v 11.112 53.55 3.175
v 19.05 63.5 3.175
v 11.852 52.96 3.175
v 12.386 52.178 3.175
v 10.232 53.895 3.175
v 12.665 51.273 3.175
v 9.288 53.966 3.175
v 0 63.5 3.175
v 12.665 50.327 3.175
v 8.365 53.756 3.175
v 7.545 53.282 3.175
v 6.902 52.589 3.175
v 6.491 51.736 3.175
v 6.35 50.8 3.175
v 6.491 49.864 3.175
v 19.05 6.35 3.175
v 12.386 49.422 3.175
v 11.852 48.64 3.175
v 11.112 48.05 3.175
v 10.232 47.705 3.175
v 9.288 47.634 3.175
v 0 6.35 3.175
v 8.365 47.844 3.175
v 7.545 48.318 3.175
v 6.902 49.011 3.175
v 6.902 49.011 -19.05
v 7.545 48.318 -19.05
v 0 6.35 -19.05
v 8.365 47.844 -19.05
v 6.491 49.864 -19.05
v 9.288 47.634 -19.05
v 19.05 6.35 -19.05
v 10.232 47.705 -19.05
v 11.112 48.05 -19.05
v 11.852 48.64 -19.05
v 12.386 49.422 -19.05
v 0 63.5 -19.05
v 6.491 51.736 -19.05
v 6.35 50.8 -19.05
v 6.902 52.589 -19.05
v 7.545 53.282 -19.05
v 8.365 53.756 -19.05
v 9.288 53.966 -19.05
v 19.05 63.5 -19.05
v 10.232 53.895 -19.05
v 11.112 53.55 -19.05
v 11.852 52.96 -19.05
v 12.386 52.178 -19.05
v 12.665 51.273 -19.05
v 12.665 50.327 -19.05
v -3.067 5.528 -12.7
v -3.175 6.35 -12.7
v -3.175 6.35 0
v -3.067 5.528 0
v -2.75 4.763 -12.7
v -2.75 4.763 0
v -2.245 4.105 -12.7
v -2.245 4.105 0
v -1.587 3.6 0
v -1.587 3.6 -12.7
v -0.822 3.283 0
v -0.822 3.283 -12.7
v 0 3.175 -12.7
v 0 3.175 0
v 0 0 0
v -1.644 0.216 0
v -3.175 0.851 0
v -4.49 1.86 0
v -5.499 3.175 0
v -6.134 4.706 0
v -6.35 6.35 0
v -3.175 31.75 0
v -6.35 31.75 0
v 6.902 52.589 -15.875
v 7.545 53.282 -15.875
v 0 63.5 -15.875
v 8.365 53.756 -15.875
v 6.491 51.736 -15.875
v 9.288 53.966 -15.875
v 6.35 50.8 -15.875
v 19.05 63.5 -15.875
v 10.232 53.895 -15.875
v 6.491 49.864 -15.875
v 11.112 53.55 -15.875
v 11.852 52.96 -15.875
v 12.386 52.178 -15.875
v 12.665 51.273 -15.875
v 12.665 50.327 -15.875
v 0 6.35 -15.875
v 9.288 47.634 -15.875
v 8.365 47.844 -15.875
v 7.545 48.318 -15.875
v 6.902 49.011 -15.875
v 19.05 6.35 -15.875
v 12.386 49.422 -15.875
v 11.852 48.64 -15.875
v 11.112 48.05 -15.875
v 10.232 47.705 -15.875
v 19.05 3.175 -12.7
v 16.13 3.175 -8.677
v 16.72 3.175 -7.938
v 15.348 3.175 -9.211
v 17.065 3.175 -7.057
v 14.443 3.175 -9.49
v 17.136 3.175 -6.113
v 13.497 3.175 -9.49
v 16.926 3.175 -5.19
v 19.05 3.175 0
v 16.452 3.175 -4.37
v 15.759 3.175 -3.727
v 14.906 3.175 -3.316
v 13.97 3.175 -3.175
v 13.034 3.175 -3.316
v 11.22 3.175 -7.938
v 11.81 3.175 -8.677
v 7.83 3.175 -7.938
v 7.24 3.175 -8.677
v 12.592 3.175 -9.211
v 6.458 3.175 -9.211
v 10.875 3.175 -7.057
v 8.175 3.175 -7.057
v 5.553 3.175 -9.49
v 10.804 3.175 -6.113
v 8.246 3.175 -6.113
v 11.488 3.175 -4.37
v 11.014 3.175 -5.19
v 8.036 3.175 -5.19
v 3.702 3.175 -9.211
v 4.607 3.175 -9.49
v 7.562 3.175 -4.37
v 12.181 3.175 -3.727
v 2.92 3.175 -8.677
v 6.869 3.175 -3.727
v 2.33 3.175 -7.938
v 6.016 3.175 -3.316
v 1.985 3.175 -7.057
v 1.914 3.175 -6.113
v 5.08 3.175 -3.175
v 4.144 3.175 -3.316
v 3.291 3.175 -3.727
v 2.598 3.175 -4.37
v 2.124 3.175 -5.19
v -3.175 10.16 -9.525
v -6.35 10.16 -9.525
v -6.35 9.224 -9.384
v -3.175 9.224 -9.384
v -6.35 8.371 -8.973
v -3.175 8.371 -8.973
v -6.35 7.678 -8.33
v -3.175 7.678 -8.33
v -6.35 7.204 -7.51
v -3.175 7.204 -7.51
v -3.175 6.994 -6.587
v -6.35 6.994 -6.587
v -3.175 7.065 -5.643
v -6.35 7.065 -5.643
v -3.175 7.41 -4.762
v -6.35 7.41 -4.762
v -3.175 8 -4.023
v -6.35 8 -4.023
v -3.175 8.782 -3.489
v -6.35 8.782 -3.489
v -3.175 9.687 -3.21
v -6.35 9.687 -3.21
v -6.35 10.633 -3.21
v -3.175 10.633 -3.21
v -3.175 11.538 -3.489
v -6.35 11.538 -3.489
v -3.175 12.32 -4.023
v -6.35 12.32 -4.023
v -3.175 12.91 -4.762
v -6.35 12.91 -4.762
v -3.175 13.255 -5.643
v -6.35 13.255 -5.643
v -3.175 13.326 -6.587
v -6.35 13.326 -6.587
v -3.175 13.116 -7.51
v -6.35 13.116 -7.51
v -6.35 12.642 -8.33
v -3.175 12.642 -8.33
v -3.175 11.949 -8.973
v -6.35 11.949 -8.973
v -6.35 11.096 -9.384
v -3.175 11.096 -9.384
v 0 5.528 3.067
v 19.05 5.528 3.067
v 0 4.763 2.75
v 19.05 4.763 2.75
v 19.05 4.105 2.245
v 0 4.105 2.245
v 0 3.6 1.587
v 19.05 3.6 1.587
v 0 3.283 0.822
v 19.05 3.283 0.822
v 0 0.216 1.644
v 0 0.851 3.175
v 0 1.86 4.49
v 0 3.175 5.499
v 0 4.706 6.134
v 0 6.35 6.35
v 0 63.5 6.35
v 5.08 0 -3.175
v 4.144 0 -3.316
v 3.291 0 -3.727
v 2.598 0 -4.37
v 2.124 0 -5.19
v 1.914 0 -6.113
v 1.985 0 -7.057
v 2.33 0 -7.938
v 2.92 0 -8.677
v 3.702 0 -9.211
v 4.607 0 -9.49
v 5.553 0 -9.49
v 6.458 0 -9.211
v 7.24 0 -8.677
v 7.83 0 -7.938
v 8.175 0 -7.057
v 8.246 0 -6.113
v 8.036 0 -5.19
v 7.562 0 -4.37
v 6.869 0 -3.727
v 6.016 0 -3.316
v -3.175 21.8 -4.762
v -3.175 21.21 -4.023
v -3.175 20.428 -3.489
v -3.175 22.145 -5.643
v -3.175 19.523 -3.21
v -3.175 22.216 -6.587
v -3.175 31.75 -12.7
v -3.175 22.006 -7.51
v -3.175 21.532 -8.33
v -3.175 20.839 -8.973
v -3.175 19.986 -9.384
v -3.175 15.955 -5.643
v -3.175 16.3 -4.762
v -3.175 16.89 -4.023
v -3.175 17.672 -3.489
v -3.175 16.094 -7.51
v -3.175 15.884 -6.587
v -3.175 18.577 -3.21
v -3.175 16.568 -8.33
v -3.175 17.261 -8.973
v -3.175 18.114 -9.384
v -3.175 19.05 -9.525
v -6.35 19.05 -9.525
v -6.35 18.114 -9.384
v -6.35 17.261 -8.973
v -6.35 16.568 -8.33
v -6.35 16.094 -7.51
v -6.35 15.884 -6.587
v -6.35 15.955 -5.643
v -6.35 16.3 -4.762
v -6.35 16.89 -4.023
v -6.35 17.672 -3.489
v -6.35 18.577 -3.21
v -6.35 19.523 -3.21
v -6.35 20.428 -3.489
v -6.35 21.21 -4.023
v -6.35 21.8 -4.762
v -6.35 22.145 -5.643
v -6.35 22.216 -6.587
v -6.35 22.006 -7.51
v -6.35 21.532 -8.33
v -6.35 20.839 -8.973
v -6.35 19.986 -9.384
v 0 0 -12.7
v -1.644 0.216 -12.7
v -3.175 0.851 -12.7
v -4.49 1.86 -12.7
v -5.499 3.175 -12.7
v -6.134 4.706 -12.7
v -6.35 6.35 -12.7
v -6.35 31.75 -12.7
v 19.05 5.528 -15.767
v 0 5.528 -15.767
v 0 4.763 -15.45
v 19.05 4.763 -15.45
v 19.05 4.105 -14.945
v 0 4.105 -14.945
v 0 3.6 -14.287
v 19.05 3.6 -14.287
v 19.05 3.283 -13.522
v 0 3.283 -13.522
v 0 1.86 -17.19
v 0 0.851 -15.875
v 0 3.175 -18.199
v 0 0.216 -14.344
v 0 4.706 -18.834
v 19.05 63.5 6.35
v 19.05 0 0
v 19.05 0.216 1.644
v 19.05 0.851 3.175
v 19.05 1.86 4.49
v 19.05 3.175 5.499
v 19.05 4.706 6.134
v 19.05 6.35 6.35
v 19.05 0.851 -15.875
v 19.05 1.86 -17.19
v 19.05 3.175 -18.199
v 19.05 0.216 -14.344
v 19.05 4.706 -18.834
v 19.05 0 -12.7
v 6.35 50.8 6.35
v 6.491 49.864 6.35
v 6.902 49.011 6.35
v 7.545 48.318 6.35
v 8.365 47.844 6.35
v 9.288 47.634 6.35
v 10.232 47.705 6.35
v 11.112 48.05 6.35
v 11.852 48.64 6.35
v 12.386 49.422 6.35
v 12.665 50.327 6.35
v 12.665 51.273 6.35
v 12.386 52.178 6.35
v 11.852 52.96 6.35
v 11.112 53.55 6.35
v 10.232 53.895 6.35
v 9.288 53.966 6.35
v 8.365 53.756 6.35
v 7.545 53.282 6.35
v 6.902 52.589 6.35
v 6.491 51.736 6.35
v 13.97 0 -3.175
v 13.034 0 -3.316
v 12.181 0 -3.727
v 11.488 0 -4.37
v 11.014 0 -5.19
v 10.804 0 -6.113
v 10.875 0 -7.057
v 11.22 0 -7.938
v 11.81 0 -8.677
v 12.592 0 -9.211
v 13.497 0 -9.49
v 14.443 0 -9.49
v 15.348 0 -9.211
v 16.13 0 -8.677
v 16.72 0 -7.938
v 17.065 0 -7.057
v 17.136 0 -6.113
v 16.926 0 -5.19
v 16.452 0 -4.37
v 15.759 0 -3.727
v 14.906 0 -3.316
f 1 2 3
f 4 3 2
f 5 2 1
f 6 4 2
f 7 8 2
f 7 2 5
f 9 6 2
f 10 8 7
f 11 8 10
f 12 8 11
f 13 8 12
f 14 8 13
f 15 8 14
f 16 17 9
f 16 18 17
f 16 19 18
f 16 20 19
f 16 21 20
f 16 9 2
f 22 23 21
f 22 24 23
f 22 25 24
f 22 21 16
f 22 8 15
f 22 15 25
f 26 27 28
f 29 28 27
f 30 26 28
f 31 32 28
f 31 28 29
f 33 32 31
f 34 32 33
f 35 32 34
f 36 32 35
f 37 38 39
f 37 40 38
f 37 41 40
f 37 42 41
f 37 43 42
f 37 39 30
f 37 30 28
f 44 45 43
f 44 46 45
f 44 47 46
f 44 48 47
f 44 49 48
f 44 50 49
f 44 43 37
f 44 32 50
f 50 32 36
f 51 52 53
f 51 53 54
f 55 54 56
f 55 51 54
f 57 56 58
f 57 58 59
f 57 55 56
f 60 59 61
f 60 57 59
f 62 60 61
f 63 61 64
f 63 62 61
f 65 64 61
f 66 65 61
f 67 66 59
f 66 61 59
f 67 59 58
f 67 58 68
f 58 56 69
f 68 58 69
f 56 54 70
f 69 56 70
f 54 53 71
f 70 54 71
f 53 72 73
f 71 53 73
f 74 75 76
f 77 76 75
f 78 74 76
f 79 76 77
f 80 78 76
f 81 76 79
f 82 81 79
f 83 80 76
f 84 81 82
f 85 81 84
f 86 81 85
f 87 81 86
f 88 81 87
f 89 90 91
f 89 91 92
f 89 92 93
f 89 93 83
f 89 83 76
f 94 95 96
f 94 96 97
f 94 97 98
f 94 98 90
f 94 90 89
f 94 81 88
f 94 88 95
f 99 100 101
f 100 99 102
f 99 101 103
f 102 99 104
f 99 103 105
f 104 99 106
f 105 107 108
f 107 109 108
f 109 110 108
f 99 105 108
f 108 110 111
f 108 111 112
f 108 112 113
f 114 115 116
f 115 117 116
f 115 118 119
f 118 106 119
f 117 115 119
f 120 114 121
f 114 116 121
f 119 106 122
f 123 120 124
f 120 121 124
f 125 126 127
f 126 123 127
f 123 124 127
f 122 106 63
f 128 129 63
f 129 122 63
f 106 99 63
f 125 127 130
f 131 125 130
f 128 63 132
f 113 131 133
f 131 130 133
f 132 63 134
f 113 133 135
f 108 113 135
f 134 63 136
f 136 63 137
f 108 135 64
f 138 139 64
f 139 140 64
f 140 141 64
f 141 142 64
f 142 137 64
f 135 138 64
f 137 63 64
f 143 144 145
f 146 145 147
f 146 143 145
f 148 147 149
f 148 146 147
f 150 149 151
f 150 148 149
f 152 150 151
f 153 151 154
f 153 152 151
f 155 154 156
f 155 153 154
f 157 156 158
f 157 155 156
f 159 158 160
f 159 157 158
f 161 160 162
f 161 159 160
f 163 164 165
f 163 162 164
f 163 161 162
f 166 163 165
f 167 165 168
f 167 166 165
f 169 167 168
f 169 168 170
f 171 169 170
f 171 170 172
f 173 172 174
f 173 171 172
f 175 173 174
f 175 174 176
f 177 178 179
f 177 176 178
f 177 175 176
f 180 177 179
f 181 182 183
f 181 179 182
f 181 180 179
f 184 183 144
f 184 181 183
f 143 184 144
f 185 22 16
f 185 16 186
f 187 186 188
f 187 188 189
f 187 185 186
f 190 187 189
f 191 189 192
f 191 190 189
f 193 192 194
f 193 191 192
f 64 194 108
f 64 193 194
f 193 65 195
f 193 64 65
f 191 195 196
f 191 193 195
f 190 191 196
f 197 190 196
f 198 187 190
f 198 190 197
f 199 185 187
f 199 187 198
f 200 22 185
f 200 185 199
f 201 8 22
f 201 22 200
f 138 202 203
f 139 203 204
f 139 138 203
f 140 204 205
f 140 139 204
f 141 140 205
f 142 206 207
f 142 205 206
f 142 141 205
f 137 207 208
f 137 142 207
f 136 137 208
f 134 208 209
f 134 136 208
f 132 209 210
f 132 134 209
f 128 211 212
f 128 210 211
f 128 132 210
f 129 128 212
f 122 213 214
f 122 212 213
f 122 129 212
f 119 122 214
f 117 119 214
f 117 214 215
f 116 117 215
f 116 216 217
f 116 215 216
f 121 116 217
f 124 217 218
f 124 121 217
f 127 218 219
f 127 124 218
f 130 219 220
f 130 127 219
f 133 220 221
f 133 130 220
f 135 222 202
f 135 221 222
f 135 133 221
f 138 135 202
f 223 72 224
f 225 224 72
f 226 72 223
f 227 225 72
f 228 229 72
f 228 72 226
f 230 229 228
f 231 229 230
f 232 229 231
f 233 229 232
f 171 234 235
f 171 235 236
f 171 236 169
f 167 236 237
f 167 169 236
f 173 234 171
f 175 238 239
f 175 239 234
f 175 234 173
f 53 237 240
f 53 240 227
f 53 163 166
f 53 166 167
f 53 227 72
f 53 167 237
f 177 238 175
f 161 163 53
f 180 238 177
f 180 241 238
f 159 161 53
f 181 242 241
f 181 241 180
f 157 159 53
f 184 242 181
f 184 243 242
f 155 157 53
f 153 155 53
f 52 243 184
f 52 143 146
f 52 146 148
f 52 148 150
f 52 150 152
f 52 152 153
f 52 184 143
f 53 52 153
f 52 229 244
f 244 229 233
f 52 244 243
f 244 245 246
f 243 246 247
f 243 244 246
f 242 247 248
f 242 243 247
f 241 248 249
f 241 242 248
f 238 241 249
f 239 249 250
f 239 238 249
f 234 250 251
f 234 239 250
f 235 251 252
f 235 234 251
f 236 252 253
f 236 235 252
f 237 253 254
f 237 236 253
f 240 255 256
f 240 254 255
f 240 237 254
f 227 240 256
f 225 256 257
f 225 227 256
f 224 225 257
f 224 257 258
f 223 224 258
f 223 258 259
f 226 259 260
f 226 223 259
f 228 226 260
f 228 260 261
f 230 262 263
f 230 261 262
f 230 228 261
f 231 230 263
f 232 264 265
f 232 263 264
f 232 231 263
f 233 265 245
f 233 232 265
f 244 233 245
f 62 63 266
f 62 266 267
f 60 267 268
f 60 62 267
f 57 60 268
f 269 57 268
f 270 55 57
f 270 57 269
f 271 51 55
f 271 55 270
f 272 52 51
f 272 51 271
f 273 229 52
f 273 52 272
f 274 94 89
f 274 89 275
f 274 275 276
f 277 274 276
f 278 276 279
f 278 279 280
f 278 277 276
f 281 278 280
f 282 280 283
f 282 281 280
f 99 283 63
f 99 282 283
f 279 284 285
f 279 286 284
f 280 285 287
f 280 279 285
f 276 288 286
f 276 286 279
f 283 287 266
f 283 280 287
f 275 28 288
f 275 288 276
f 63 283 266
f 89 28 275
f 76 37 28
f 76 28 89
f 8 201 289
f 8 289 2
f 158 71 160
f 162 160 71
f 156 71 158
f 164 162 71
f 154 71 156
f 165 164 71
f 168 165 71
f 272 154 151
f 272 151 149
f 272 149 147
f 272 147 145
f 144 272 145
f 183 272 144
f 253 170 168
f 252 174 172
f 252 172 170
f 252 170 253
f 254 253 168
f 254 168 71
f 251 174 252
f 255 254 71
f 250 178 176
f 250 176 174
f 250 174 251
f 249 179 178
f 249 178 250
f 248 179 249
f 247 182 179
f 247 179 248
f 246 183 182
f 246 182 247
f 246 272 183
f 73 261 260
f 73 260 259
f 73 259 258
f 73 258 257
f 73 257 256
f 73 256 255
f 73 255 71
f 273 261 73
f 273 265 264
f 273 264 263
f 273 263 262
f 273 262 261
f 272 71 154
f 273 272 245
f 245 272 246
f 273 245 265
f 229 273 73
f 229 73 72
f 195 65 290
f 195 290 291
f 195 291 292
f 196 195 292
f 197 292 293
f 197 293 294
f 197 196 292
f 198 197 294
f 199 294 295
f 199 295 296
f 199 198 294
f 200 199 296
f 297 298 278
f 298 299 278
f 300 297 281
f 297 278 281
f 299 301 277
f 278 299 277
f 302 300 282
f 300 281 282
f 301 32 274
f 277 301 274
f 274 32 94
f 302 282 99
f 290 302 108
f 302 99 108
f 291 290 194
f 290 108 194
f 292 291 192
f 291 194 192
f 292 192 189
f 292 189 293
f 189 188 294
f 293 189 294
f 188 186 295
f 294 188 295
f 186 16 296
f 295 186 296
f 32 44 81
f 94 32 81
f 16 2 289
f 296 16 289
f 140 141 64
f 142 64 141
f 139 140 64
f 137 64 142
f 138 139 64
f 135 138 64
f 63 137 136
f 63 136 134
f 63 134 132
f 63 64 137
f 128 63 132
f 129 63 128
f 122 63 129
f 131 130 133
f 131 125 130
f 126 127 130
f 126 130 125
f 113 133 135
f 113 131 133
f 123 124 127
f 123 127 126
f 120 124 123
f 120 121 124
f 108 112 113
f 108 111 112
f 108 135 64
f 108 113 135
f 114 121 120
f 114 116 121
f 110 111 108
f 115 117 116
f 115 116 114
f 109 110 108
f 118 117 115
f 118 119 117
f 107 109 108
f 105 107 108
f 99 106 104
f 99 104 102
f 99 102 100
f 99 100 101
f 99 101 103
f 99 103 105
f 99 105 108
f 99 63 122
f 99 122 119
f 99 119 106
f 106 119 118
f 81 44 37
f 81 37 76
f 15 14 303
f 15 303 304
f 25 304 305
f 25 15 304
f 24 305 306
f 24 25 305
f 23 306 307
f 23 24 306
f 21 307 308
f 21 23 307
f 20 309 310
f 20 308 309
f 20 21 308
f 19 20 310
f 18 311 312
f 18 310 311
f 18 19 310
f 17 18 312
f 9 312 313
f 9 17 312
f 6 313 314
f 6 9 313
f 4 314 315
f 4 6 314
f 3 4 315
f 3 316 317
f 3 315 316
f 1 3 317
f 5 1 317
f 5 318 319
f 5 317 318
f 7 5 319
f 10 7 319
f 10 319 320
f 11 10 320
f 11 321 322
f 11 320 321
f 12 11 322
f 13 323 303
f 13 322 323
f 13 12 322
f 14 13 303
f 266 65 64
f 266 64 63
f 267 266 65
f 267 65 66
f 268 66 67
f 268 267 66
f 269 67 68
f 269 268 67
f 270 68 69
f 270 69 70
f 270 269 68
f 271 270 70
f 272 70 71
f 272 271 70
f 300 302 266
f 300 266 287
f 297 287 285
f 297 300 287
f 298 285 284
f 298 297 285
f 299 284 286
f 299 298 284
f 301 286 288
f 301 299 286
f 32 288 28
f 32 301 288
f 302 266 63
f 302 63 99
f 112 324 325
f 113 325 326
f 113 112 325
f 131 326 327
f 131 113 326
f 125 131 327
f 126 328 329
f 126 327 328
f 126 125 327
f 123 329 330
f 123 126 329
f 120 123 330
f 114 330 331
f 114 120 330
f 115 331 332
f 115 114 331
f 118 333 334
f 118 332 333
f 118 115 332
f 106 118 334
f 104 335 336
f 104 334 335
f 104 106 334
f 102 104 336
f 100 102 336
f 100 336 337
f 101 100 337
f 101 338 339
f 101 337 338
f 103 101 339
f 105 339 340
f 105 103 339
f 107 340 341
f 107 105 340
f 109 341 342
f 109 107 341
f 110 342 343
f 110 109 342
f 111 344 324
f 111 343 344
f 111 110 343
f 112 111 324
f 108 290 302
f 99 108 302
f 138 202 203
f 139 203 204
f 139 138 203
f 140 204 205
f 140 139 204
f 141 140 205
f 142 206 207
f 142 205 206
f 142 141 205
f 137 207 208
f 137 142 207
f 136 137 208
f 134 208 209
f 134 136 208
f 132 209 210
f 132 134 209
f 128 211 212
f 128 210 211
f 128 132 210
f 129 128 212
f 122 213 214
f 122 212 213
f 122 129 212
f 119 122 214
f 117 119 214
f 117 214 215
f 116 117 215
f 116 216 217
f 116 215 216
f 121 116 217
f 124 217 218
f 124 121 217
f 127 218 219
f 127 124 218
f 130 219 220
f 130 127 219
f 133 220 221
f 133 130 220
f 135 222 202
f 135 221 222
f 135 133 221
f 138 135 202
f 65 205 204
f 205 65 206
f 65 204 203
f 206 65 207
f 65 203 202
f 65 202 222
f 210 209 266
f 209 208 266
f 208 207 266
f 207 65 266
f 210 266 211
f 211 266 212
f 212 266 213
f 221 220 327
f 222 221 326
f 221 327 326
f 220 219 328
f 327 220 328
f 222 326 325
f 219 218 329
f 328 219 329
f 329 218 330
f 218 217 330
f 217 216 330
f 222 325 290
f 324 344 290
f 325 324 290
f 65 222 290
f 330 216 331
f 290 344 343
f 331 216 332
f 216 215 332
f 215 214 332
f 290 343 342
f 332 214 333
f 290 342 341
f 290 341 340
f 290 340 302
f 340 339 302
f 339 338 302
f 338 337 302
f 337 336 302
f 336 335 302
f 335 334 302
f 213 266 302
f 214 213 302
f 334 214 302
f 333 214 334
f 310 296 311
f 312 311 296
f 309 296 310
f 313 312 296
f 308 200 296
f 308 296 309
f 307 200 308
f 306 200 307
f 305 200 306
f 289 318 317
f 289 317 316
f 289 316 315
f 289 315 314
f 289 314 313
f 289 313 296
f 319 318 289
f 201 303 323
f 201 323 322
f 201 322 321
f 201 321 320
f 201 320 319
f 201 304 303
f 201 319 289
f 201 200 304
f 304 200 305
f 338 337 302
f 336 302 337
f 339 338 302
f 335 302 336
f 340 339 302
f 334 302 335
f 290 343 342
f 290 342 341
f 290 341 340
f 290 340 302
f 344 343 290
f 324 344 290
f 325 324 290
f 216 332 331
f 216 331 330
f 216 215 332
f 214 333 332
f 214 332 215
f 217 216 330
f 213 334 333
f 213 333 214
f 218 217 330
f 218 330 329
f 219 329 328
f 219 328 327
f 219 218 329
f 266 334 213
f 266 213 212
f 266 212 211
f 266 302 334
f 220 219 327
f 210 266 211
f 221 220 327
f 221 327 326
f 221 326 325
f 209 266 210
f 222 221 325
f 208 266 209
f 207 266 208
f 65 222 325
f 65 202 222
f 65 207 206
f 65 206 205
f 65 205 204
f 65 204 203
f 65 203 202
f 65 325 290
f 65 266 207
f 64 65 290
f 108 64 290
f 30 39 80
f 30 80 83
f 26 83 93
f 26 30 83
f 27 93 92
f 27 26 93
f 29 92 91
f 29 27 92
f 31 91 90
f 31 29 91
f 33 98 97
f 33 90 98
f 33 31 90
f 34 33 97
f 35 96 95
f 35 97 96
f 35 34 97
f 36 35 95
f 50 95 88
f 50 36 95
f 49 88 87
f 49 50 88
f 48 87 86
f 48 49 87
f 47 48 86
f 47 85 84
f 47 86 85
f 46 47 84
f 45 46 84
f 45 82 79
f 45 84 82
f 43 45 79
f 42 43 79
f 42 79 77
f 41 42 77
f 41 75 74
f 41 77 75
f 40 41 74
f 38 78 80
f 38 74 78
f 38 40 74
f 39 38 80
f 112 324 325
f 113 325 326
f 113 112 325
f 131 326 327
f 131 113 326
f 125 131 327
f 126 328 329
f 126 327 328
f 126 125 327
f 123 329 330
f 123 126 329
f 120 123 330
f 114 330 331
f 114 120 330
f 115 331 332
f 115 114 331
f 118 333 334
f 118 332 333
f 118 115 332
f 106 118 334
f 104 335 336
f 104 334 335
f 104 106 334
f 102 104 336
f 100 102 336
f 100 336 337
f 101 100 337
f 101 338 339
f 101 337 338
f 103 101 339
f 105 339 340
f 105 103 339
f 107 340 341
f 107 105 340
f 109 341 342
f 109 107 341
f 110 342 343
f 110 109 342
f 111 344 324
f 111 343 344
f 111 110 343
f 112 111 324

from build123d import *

# Parameters (mm, degrees)
SKETCH1_W                            = 19.05
SKETCH1_H                            = 12.7
BOSS_EXTRUDE1_DEPTH                  = 3.175
CONVERT_SOLID3_OUTLINE_W             = 3.175
CONVERT_SOLID3_OUTLINE_H             = 12.7
CONVERT_SOLID3_DEPTH                 = 19.05
EDGE_FLANGE1_DEPTH                   = 19.05
EDGE_FLANGE1_BEND_DEPTH              = 19.05
EDGE_FLANGE3_DEPTH                   = 12.7
CUT_EXTRUDE1_DEPTH                   = 71.995158286
CUT_EXTRUDE1_DEPTH_BACK              = 71.995158286
SKETCH23_R                           = 3.175
F_1_4_0_25_DIAMETER_HOLE1_AT_2_COUNT = 2
F_1_4_0_25_DIAMETER_HOLE1_AT_2_PITCH = 8.89
F_1_4_0_25_DIAMETER_HOLE2_AT_2_COUNT = 2
F_1_4_0_25_DIAMETER_HOLE2_AT_2_PITCH = 8.89


# Read off the part's stored shape, not the designer's step: Convert-Solid3
# Sheet-metal steps are written as plain solids
with BuildPart() as part:
    # Sketch1 → Boss-Extrude1 (new body)
    with BuildSketch(Plane(origin=(0, 0, 0), x_dir=(1, 0, 0), z_dir=(0, 1, 0))):
        with Locations((9.525, 6.35)):
            Rectangle(SKETCH1_W, SKETCH1_H)
    extrude(amount=BOSS_EXTRUDE1_DEPTH)


with BuildPart() as body_2:
    # Convert-Solid3 outline → Convert-Solid3 (new body)
    with BuildSketch(Plane.YZ):
        with Locations((1.5875, -6.35)):
            Rectangle(CONVERT_SOLID3_OUTLINE_W, CONVERT_SOLID3_OUTLINE_H)
    extrude(amount=CONVERT_SOLID3_DEPTH)

    # Edge-Flange1 section (across the edge) → Edge-Flange1 (add)
    with BuildSketch(Plane(origin=(19.05, 3.175, -15.875), x_dir=(0, 0, 1), z_dir=(-1, 0, 0))):
        with BuildLine():
            Line((-3.175, 3.175), (-3.175, 60.325))
            Line((-3.175, 60.325), (0, 60.325))
            Line((0, 60.325), (0, 3.175))
            ThreePointArc((0, 3.175), (0.92993597, 0.92993597), (3.175, 0))
            Line((3.175, 0), (3.175, -3.175))
            ThreePointArc((3.175, -3.175), (-1.315128061, -1.315128061), (-3.175, 3.175))
        make_face()
    extrude(amount=EDGE_FLANGE1_DEPTH)

    # Edge-Flange1 section 2 (across the edge) → Edge-Flange1 bend (add)
    with BuildSketch(Plane(origin=(0, 3.175, 3.175), x_dir=(0, 0, -1), z_dir=(1, 0, 0))):
        with BuildLine():
            Line((-3.175, 3.175), (-3.175, 60.325))
            Line((-3.175, 60.325), (0, 60.325))
            Line((0, 60.325), (0, 3.175))
            ThreePointArc((0, 3.175), (0.92993597, 0.92993597), (3.175, 0))
            Line((3.175, 0), (3.175, -3.175))
            ThreePointArc((3.175, -3.175), (-1.315128061, -1.315128061), (-3.175, 3.175))
        make_face()
    extrude(amount=EDGE_FLANGE1_BEND_DEPTH)

    # Edge-Flange3 section (across the edge) → Edge-Flange3 (add)
    with BuildSketch(Plane(origin=(-3.175, 3.175, -12.7), x_dir=(1, 0, 0), z_dir=(0, 0, 1))):
        with BuildLine():
            Line((-3.175, 3.175), (-3.175, 28.575))
            Line((-3.175, 28.575), (0, 28.575))
            Line((0, 28.575), (0, 3.175))
            ThreePointArc((0, 3.175), (0.92993597, 0.92993597), (3.175, 0))
            Line((3.175, 0), (3.175, -3.175))
            ThreePointArc((3.175, -3.175), (-1.315128061, -1.315128061), (-3.175, 3.175))
        make_face()
    extrude(amount=EDGE_FLANGE3_DEPTH)

    # Sketch23 → Cut-Extrude1 (cut, two sides: drawn at the far end of the back side and taken through both)
    with BuildSketch(Plane.XY.offset(6.35).offset(-CUT_EXTRUDE1_DEPTH_BACK)):
        with Locations(Location((9.525, 50.8, 0), (0, 0, 180))):
            Circle(SKETCH23_R)
    extrude(amount=CUT_EXTRUDE1_DEPTH + CUT_EXTRUDE1_DEPTH_BACK, mode=Mode.SUBTRACT)


with BuildPart() as f_1_4_0_25_diameter_hole1_tool:
    # Sketch25 → 1/4 (0.25) Diameter Hole1 (revolve)
    with BuildSketch(Plane(origin=(5.08, 3.175, -6.35), x_dir=(0, 0, 1), z_dir=(1, 0, 0))):
        Polygon((0, 0), (0, 18.417732465), (3.175, 16.51), (3.175, 0), align=None)
    f_1_4_0_25_diameter_hole1 = revolve(axis=Axis((5.08, 9.525, -6.35), (0, -1, 0)))


with BuildPart() as part_1:
    add(part.part)

    # 1/4 (0.25) Diameter Hole1: cut by f_1_4_0_25_diameter_hole1_tool
    add(f_1_4_0_25_diameter_hole1_tool.part, mode=Mode.SUBTRACT)


with BuildPart() as body_2_1:
    add(body_2.part)

    # 1/4 (0.25) Diameter Hole1: cut by f_1_4_0_25_diameter_hole1_tool
    add(f_1_4_0_25_diameter_hole1_tool.part, mode=Mode.SUBTRACT)


with BuildPart() as f_1_4_0_25_diameter_hole1_at_2_tool:
    # 1/4 (0.25) Diameter Hole1 at 2: 1/4 (0.25) Diameter Hole1 ×2
    with Locations(*[(i * F_1_4_0_25_DIAMETER_HOLE1_AT_2_PITCH, 0, 0) for i in range(1, F_1_4_0_25_DIAMETER_HOLE1_AT_2_COUNT)]):
        add(f_1_4_0_25_diameter_hole1)


with BuildPart() as part_2:
    add(part_1.part)

    # 1/4 (0.25) Diameter Hole1 at 2: cut by f_1_4_0_25_diameter_hole1_at_2_tool
    add(f_1_4_0_25_diameter_hole1_at_2_tool.part, mode=Mode.SUBTRACT)


with BuildPart() as body_2_2:
    add(body_2_1.part)

    # 1/4 (0.25) Diameter Hole1 at 2: cut by f_1_4_0_25_diameter_hole1_at_2_tool
    add(f_1_4_0_25_diameter_hole1_at_2_tool.part, mode=Mode.SUBTRACT)

    # Sketch38 → 1/4 (0.25) Diameter Hole2 (revolve, cut)
    with BuildSketch(Plane(origin=(-3.175, 10.16, -6.35), x_dir=(0, 0, -1), z_dir=(0, 1, 0))):
        Polygon((0, 0), (0, 18.417732465), (3.175, 16.51), (3.175, 0), align=None)
    f_1_4_0_25_diameter_hole2 = revolve(axis=Axis((3.175, 10.16, -6.35), (-1, 0, 0)), mode=Mode.SUBTRACT)

    # 1/4 (0.25) Diameter Hole2 at 2: 1/4 (0.25) Diameter Hole2 ×2
    with Locations(*[(0, i * F_1_4_0_25_DIAMETER_HOLE2_AT_2_PITCH, 0) for i in range(1, F_1_4_0_25_DIAMETER_HOLE2_AT_2_COUNT)]):
        add(f_1_4_0_25_diameter_hole2, mode=Mode.SUBTRACT)


solid = Compound([part_2.part, body_2_2.part])
